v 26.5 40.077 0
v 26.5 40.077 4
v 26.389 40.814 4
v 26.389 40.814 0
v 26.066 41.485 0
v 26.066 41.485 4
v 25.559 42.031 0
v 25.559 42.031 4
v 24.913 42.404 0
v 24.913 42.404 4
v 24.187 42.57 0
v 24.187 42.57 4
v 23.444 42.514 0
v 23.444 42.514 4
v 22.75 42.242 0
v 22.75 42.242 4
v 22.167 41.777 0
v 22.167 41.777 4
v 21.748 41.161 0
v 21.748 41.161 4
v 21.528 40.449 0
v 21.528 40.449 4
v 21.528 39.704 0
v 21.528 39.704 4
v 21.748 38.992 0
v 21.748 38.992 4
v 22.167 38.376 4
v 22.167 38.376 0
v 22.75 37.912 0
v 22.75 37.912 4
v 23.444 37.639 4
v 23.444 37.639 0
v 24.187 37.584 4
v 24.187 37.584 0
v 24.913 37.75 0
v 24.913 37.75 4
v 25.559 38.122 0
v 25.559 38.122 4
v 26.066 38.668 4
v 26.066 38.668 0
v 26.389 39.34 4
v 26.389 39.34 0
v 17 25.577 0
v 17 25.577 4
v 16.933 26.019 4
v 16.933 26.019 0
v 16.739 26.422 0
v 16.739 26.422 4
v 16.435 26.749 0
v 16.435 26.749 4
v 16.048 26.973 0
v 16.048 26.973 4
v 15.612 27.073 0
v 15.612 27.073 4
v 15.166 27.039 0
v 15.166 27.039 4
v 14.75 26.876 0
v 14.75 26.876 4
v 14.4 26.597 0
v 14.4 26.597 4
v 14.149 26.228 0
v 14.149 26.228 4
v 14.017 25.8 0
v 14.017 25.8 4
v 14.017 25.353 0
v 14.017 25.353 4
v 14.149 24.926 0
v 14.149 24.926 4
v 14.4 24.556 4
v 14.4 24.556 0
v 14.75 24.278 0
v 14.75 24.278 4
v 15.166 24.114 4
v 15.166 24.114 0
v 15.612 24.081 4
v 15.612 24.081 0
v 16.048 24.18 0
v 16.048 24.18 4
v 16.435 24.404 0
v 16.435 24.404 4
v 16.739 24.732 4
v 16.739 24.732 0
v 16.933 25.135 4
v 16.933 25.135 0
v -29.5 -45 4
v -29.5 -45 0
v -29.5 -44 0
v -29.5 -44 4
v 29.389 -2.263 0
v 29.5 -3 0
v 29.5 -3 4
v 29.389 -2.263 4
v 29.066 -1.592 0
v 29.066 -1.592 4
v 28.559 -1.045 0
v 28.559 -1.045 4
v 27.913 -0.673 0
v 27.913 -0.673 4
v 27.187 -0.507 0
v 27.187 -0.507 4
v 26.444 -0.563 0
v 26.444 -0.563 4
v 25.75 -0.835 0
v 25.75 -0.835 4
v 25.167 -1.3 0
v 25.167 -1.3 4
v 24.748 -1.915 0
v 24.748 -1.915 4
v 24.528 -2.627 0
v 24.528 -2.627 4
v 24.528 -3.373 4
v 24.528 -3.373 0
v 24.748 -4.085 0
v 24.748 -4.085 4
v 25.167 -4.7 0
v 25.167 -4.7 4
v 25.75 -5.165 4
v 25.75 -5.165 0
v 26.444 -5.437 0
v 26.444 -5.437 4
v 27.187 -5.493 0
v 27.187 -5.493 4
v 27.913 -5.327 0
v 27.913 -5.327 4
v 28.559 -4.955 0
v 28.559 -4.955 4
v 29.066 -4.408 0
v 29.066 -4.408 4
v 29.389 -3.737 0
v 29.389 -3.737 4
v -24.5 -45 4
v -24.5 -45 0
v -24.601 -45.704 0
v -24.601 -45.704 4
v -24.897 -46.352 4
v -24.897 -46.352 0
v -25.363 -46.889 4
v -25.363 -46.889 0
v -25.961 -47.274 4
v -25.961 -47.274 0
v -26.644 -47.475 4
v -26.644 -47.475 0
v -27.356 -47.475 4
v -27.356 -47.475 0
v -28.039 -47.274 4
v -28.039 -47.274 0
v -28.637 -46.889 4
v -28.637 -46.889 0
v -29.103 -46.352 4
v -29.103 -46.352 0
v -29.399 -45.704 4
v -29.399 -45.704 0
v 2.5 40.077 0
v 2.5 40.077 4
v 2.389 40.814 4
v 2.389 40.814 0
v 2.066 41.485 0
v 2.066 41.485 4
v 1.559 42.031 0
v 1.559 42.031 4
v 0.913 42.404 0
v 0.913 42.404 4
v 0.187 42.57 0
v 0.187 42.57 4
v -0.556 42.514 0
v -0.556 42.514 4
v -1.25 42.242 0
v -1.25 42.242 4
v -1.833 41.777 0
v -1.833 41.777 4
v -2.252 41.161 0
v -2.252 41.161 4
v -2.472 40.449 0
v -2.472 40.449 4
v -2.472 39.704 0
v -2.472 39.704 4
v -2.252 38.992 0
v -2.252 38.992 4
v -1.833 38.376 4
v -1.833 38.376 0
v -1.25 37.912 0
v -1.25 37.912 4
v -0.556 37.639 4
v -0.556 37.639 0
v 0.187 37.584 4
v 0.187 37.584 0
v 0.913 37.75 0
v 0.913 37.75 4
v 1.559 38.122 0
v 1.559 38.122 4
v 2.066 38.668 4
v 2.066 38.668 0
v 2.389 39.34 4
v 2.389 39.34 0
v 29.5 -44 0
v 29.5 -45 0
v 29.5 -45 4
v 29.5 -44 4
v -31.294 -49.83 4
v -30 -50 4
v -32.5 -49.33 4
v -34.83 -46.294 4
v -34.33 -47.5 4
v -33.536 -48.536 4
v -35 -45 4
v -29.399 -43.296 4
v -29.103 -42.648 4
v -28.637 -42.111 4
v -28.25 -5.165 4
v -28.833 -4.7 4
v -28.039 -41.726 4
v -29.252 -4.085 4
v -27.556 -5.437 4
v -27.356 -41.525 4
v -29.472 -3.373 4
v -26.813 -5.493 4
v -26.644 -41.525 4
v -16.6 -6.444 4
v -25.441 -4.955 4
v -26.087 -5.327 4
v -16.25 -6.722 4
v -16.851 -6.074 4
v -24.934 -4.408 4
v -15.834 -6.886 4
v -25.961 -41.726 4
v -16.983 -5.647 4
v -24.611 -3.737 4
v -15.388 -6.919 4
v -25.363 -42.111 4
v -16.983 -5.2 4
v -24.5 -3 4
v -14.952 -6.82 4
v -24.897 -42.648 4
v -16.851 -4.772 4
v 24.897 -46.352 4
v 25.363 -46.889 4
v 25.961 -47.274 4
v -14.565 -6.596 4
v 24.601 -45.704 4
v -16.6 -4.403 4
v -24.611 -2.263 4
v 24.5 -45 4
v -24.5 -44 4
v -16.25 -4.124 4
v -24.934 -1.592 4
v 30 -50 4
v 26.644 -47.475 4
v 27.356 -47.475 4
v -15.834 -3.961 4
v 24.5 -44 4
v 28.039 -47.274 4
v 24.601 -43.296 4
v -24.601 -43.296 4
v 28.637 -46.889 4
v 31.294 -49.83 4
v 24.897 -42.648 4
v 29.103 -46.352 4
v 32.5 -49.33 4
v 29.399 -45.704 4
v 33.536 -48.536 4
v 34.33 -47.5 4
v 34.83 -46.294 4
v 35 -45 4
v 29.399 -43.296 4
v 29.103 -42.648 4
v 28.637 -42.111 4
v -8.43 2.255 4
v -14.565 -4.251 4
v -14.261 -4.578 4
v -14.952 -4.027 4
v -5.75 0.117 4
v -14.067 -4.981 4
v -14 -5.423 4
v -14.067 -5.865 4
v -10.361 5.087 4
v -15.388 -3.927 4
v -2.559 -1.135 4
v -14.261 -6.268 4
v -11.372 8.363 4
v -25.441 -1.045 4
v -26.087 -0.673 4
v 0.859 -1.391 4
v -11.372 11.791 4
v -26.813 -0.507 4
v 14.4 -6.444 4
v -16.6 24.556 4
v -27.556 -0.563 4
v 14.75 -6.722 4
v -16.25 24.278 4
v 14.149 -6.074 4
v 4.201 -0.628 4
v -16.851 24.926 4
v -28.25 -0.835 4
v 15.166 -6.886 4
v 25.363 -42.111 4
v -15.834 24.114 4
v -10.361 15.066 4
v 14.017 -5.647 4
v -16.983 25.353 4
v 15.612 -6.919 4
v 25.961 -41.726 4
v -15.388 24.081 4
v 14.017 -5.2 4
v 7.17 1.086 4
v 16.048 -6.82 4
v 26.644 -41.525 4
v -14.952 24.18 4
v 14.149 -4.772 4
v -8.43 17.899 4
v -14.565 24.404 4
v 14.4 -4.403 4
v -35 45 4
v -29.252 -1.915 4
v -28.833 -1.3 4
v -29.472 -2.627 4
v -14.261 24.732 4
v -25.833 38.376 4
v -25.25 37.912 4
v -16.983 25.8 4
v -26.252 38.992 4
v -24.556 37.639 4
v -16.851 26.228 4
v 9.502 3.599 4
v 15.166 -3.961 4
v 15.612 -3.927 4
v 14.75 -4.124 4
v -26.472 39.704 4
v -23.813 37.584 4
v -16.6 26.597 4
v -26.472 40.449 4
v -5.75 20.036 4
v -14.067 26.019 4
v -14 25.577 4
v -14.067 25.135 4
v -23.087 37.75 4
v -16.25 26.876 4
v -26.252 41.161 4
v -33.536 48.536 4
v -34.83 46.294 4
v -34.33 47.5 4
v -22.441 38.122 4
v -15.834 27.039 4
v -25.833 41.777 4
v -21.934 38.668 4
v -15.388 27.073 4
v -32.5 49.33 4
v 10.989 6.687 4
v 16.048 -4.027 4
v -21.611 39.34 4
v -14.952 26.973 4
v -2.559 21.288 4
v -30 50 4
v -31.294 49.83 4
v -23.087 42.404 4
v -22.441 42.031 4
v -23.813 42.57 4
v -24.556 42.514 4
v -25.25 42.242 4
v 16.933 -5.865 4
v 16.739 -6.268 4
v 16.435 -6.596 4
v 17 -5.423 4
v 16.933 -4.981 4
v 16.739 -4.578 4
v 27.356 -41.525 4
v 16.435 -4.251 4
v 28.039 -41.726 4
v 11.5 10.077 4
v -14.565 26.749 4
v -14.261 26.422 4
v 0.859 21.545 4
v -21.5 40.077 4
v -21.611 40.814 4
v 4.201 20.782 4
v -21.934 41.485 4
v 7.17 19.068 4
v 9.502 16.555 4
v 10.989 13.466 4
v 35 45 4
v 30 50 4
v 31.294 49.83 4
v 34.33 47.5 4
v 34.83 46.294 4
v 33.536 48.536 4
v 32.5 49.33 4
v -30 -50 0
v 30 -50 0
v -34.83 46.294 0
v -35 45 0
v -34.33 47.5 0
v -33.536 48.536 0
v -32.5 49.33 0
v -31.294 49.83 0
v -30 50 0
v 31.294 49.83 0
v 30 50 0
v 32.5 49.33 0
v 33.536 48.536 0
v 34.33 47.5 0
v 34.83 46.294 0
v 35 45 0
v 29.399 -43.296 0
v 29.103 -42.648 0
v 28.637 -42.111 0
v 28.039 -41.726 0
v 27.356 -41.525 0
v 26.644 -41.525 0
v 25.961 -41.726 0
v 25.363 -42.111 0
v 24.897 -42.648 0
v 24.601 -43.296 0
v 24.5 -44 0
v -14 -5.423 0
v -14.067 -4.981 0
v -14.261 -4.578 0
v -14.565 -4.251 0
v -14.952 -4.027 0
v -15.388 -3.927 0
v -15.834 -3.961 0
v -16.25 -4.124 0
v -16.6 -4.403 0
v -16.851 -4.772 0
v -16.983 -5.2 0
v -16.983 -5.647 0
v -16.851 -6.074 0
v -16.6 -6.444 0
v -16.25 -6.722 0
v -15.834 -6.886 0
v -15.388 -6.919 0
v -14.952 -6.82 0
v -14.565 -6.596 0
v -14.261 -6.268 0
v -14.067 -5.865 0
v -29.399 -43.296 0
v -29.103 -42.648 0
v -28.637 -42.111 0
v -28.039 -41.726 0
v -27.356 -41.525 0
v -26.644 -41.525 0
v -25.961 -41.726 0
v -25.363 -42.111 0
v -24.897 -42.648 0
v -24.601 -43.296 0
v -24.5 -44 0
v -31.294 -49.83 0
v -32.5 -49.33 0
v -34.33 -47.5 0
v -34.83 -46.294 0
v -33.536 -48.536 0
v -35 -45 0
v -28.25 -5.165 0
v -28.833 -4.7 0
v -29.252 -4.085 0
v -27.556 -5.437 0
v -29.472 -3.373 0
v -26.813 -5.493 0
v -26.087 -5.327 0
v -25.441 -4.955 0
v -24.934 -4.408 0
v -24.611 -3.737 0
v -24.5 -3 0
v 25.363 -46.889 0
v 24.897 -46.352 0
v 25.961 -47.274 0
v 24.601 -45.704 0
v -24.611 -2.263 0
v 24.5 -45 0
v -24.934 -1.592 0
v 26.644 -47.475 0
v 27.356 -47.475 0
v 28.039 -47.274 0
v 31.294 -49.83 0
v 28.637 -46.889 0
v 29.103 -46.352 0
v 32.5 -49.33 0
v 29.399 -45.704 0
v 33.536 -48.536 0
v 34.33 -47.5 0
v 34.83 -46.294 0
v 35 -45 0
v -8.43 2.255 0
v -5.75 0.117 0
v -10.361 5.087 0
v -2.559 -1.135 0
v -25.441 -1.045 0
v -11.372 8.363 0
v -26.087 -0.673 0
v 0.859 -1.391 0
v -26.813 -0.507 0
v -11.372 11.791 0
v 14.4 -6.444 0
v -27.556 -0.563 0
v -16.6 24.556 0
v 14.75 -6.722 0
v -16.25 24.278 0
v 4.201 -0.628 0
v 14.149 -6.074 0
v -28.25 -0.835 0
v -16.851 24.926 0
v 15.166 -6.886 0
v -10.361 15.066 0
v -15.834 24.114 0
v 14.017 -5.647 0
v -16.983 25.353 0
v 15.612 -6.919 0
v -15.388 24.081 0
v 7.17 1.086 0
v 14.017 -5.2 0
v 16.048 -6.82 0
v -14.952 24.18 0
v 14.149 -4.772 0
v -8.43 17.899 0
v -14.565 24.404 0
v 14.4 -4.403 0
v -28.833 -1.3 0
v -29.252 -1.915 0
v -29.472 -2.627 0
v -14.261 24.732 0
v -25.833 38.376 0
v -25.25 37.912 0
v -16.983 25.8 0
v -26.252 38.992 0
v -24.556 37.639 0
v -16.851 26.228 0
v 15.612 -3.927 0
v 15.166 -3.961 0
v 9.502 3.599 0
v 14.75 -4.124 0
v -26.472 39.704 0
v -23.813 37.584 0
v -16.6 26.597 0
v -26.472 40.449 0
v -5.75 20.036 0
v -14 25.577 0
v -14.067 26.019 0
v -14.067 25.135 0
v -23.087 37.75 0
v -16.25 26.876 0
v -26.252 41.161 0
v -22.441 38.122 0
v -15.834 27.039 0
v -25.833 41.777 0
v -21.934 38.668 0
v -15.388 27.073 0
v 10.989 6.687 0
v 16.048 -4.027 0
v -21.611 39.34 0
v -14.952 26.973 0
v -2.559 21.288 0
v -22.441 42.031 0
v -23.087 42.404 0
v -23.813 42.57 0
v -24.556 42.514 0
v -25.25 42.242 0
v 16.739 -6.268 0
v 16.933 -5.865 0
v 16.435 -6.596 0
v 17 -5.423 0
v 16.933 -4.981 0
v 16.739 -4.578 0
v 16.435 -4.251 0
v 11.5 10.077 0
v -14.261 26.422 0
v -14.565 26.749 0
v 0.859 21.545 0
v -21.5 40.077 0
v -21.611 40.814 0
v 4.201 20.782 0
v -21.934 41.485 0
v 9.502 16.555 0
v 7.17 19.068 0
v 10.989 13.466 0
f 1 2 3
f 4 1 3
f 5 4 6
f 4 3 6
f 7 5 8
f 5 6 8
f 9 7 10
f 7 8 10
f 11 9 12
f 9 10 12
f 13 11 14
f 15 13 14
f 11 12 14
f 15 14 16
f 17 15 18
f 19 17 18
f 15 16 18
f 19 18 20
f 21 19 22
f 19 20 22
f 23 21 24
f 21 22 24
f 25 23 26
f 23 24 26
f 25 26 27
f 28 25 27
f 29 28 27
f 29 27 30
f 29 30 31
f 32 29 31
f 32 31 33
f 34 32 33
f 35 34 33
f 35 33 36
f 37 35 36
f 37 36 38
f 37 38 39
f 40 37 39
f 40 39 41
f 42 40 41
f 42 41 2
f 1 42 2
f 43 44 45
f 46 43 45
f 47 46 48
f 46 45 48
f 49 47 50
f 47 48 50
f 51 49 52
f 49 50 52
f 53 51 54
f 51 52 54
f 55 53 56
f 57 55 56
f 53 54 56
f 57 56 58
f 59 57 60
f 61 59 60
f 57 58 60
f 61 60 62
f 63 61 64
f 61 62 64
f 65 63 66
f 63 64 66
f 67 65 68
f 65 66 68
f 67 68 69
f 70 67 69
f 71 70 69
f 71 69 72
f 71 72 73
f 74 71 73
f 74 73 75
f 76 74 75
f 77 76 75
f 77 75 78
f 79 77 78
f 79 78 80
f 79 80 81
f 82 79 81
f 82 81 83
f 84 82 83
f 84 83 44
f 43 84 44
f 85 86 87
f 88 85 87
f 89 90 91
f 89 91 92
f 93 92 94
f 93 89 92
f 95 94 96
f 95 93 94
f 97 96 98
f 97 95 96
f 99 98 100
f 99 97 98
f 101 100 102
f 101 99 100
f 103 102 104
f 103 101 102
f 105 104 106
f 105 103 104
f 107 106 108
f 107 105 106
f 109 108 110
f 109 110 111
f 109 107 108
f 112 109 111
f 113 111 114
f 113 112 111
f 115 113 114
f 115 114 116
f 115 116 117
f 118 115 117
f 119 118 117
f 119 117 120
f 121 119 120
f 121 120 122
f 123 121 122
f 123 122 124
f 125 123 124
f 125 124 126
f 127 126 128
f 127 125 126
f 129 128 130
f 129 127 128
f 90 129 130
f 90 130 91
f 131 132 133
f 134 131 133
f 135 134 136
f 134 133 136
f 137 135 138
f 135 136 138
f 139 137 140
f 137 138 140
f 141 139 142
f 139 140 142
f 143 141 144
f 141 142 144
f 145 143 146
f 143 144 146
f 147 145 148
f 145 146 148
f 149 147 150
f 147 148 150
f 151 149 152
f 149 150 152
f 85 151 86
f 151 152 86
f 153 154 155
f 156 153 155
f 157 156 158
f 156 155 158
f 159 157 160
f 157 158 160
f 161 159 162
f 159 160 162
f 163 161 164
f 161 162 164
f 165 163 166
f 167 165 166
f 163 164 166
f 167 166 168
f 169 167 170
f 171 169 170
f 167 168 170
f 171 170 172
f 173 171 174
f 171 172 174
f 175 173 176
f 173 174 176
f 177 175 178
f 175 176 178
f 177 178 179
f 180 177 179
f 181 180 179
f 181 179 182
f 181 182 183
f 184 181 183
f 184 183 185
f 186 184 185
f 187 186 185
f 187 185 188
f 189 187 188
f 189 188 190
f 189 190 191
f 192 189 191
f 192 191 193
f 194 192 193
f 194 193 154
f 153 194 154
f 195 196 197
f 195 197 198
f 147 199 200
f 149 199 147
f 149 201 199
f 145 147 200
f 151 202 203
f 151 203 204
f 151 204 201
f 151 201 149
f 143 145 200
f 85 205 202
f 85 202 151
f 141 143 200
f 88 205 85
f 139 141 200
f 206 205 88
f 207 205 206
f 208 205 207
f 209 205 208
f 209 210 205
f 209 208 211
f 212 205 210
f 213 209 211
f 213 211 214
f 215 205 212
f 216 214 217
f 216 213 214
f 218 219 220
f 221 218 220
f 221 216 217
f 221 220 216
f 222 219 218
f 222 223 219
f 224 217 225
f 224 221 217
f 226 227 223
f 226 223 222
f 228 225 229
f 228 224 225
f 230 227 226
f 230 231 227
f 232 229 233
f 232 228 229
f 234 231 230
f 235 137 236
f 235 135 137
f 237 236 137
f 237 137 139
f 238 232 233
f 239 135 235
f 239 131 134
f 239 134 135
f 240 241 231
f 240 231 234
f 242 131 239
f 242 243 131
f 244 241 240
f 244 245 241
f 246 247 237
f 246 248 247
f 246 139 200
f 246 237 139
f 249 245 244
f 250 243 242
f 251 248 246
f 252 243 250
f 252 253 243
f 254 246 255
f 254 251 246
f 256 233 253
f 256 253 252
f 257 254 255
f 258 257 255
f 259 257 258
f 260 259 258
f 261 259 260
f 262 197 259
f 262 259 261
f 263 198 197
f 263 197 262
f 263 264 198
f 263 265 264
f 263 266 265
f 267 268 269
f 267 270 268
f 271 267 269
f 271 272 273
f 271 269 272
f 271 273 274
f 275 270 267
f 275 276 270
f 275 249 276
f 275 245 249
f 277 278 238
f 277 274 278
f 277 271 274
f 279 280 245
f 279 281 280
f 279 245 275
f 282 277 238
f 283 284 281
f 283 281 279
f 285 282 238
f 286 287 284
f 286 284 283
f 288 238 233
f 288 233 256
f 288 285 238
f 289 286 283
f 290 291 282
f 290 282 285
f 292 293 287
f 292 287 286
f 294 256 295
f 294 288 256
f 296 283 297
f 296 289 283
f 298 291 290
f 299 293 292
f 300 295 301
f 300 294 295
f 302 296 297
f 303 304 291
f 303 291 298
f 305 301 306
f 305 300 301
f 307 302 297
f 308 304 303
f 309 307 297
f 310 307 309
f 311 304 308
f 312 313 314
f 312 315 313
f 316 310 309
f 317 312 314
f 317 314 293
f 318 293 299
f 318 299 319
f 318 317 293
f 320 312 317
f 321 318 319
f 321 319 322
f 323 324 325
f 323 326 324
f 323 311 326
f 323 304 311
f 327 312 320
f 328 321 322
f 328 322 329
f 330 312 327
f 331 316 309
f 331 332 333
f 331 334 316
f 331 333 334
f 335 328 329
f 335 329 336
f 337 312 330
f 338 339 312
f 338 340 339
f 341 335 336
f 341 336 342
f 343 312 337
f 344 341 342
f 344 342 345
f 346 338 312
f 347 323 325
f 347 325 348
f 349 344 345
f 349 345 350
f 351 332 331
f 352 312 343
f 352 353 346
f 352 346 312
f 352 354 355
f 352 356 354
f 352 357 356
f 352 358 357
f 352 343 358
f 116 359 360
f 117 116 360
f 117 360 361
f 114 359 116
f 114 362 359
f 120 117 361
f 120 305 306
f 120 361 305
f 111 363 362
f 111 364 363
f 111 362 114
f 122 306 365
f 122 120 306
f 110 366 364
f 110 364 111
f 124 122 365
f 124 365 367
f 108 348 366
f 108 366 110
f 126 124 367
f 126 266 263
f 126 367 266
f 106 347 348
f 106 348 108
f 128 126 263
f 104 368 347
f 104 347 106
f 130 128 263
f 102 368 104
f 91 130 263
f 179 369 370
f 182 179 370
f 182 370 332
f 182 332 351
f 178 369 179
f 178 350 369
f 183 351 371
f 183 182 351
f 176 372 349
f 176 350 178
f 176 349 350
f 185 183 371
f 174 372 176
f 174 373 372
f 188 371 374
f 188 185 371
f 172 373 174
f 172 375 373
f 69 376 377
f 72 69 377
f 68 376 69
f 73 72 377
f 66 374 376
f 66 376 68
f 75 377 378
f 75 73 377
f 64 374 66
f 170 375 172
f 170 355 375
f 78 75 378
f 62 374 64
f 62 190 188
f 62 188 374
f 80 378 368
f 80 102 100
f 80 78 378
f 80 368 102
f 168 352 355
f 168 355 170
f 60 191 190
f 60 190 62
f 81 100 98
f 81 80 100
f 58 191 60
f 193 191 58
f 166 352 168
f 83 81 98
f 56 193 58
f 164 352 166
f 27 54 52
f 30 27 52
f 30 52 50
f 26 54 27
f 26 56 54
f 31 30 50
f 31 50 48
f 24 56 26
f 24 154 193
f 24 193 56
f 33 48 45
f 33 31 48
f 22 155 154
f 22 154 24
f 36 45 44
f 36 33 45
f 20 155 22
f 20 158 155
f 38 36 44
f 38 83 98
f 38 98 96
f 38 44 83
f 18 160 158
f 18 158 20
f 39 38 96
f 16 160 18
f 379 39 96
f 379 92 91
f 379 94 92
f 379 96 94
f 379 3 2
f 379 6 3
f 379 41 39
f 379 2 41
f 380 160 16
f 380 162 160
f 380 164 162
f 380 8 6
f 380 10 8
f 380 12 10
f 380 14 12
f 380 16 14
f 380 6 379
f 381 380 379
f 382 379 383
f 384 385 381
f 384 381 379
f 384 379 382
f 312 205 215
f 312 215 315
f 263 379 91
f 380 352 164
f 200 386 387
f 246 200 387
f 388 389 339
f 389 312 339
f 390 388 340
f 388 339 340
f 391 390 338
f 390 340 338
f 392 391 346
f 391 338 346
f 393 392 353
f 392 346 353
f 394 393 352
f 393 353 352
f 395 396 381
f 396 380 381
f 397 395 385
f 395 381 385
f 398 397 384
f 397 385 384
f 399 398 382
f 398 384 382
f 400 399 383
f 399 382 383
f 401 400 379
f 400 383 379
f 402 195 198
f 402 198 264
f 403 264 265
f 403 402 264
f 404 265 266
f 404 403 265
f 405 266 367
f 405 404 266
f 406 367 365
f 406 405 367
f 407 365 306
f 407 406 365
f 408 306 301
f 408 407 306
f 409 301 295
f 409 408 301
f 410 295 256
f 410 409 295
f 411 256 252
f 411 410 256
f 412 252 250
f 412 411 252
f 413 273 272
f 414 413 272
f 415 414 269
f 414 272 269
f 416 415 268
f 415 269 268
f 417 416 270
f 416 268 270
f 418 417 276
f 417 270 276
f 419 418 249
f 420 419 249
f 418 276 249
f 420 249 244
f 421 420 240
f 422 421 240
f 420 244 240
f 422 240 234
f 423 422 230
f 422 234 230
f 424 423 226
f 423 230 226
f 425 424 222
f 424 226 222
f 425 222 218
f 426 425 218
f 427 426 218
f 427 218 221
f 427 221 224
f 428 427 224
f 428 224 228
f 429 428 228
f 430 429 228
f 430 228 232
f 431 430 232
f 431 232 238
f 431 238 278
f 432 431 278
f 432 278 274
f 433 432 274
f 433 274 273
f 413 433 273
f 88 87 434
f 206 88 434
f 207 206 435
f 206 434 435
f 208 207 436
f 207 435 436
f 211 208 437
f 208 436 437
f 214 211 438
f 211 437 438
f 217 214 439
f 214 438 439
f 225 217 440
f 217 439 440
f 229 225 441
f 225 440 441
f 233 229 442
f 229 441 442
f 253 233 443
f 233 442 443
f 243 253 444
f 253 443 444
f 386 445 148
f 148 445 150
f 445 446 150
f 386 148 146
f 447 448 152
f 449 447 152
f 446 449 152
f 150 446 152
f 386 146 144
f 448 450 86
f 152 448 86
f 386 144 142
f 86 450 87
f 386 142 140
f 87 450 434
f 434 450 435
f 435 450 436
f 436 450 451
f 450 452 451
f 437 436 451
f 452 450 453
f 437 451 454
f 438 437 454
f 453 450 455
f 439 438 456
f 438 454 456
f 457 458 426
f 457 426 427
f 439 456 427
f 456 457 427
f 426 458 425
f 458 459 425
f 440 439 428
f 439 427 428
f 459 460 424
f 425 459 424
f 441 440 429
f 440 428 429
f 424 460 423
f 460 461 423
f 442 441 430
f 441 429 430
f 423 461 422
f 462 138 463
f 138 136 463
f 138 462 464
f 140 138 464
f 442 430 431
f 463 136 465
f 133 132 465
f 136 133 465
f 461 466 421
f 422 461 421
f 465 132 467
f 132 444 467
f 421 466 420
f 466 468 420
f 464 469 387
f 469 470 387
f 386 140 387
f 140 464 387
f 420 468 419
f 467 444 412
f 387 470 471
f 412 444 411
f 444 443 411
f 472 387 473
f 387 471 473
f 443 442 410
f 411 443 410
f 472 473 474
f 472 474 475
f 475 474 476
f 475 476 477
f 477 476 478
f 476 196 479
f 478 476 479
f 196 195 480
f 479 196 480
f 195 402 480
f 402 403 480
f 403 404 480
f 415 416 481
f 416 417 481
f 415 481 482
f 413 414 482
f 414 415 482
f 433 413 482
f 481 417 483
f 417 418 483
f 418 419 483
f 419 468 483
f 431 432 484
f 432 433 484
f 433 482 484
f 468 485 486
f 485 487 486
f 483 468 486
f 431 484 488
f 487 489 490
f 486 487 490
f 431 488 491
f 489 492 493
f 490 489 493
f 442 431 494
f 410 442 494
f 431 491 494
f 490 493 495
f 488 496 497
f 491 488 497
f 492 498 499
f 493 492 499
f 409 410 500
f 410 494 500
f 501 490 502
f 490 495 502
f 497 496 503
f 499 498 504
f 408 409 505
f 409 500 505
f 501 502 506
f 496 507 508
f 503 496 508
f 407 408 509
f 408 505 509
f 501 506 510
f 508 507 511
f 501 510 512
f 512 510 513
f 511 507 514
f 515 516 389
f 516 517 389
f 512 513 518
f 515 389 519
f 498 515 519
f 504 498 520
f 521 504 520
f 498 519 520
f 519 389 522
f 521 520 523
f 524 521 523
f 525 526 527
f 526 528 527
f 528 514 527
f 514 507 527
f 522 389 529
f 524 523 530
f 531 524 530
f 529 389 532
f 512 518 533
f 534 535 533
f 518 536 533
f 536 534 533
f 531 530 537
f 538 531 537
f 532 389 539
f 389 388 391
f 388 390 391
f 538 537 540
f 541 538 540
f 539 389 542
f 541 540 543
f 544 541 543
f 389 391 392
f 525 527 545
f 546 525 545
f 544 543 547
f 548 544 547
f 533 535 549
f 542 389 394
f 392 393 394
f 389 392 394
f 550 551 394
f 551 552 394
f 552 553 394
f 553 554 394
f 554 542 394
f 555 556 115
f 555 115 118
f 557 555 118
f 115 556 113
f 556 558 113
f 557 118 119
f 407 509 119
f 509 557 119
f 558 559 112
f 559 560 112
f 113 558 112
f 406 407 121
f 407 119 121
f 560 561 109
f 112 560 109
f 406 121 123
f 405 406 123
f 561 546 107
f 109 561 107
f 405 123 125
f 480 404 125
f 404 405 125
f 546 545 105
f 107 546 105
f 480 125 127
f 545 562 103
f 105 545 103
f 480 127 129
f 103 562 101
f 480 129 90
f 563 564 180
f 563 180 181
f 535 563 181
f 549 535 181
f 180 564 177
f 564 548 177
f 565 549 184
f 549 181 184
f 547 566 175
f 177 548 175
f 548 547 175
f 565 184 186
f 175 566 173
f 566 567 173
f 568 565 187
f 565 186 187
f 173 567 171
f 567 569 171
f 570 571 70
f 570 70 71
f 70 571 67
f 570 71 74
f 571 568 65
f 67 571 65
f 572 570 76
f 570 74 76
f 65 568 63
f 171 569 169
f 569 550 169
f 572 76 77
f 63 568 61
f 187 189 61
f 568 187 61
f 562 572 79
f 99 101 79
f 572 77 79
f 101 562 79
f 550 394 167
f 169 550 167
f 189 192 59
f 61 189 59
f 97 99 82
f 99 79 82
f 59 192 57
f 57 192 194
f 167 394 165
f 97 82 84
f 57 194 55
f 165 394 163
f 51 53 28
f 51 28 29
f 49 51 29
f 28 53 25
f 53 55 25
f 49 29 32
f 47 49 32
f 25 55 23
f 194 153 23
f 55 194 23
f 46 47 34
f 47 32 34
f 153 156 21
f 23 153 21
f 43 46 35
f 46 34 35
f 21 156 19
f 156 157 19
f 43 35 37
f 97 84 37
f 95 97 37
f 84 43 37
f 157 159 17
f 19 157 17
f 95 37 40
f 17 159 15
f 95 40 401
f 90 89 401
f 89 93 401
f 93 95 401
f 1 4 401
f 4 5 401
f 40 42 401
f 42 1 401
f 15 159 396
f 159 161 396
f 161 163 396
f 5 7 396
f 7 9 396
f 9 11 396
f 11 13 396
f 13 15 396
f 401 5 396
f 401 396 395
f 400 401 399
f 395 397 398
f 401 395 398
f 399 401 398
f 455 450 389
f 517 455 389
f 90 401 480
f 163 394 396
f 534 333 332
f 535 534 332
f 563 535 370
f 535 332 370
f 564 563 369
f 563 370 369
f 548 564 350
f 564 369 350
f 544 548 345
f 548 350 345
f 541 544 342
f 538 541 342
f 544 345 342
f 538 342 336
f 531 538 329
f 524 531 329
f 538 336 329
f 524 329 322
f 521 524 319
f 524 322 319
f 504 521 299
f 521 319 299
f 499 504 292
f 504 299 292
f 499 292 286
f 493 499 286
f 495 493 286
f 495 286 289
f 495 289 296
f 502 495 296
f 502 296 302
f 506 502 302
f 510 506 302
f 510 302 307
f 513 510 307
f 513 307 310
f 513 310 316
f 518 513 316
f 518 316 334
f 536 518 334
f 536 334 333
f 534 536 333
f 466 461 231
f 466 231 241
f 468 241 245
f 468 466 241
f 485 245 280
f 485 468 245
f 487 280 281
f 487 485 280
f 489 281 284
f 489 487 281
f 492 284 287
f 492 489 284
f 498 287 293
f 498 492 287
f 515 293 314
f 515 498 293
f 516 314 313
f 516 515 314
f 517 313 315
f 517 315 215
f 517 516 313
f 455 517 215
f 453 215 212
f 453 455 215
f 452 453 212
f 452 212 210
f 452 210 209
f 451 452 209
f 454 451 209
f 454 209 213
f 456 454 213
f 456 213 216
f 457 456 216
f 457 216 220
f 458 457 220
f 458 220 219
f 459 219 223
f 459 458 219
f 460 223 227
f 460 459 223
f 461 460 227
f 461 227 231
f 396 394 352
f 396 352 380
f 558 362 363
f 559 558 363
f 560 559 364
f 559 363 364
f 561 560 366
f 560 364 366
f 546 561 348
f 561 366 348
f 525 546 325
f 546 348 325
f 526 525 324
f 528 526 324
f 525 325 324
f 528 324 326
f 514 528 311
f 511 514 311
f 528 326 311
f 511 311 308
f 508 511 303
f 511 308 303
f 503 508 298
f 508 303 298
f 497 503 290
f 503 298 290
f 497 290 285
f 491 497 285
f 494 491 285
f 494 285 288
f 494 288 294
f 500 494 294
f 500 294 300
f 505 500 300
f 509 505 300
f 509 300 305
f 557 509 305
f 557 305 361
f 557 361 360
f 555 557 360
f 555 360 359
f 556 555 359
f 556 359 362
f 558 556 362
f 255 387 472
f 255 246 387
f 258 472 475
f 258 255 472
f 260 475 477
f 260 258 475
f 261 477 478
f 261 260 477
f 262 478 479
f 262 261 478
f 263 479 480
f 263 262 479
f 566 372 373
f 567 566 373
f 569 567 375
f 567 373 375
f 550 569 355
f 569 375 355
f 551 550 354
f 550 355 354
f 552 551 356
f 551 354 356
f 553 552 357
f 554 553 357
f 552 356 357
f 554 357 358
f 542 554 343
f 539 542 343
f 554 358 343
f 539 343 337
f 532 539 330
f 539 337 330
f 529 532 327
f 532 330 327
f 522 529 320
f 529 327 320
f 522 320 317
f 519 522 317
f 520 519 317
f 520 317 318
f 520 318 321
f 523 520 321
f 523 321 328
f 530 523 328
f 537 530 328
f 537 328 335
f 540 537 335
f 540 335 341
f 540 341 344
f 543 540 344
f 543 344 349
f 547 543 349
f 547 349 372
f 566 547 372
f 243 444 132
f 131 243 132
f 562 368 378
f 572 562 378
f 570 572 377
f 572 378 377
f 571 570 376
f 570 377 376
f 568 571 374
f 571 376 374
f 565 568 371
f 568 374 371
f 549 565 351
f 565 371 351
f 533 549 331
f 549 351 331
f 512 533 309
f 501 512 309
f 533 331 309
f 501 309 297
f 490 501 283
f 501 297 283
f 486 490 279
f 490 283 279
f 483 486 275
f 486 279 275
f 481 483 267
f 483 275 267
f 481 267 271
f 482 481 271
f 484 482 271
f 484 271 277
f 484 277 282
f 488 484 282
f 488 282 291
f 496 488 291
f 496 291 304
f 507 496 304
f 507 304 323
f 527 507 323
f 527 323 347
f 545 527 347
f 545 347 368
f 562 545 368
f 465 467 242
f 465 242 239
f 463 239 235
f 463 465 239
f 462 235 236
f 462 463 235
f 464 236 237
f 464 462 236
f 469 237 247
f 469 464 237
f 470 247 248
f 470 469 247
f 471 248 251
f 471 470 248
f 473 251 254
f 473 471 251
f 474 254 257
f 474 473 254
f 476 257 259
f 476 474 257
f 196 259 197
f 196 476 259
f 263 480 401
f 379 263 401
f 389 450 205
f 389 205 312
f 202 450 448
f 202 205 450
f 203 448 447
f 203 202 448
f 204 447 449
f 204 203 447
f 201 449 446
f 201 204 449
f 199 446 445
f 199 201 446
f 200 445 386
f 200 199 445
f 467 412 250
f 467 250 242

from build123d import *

# Parameters (mm, degrees)
SKETCH4_W           = 70
SKETCH4_H           = 100
SKETCH4_R           = 2.5
BOSS_EXTRUDE2_DEPTH = 4
SKETCH5_R           = 11.5
SKETCH5_R_2         = 1.5
CUT_EXTRUDE2_DEPTH  = 5
SKETCH6_R           = 2.5
CUT_EXTRUDE3_DEPTH  = 5
FILLET1_R           = 5


with BuildPart() as part:
    # Sketch4 → Boss-Extrude2 (new body)
    with BuildSketch(Plane.XY):
        Rectangle(SKETCH4_W, SKETCH4_H)
        with Locations((-27, -3)):
            Circle(SKETCH4_R, mode=Mode.SUBTRACT)
        with Locations((27, -3)):
            Circle(SKETCH4_R, mode=Mode.SUBTRACT)
        with BuildLine():
            Line((-24.5, -44), (-24.5, -45))
            ThreePointArc((-24.5, -45), (-27, -47.5), (-29.5, -45))
            Line((-29.5, -45), (-29.5, -44))
            ThreePointArc((-29.5, -44), (-27, -41.5), (-24.5, -44))
        make_face(mode=Mode.SUBTRACT)
        with BuildLine():
            Line((24.5, -44), (24.5, -45))
            ThreePointArc((24.5, -45), (27, -47.5), (29.5, -45))
            Line((29.5, -45), (29.5, -44))
            ThreePointArc((29.5, -44), (27, -41.5), (24.5, -44))
        make_face(mode=Mode.SUBTRACT)
    extrude(amount=BOSS_EXTRUDE2_DEPTH)

    # Sketch5 → Cut-Extrude2 (cut, through all)
    with BuildSketch(Plane.XY.offset(4)):
        with Locations((0, 10.076696831)):
            Circle(SKETCH5_R)
        with Locations((-15.5, 25.576696831)):
            Circle(SKETCH5_R_2)
        with Locations((15.5, 25.576696831)):
            Circle(SKETCH5_R_2)
        with Locations((15.5, -5.423303169)):
            Circle(SKETCH5_R_2)
        with Locations((-15.5, -5.423303169)):
            Circle(SKETCH5_R_2)
    extrude(amount=-CUT_EXTRUDE2_DEPTH, mode=Mode.SUBTRACT)

    # Sketch6 → Cut-Extrude3 (cut, through all)
    with BuildSketch(Plane.XY.offset(4)):
        with Locations((24, 40.076696831)):
            Circle(SKETCH6_R)
        with Locations((-24, 40.076696831)):
            Circle(SKETCH6_R)
        with Locations((0, 40.076696831)):
            Circle(SKETCH6_R)
    extrude(amount=-CUT_EXTRUDE3_DEPTH, mode=Mode.SUBTRACT)

    # Fillet1
    fillet1_edges = [part.edges().sort_by_distance(p)[0] for p in [
        (35, -50, 2),
        (-35, -50, 2),
        (-35, 50, 2),
        (35, 50, 2),
    ]]
    fillet(fillet1_edges, radius=FILLET1_R)


solid = part.part
